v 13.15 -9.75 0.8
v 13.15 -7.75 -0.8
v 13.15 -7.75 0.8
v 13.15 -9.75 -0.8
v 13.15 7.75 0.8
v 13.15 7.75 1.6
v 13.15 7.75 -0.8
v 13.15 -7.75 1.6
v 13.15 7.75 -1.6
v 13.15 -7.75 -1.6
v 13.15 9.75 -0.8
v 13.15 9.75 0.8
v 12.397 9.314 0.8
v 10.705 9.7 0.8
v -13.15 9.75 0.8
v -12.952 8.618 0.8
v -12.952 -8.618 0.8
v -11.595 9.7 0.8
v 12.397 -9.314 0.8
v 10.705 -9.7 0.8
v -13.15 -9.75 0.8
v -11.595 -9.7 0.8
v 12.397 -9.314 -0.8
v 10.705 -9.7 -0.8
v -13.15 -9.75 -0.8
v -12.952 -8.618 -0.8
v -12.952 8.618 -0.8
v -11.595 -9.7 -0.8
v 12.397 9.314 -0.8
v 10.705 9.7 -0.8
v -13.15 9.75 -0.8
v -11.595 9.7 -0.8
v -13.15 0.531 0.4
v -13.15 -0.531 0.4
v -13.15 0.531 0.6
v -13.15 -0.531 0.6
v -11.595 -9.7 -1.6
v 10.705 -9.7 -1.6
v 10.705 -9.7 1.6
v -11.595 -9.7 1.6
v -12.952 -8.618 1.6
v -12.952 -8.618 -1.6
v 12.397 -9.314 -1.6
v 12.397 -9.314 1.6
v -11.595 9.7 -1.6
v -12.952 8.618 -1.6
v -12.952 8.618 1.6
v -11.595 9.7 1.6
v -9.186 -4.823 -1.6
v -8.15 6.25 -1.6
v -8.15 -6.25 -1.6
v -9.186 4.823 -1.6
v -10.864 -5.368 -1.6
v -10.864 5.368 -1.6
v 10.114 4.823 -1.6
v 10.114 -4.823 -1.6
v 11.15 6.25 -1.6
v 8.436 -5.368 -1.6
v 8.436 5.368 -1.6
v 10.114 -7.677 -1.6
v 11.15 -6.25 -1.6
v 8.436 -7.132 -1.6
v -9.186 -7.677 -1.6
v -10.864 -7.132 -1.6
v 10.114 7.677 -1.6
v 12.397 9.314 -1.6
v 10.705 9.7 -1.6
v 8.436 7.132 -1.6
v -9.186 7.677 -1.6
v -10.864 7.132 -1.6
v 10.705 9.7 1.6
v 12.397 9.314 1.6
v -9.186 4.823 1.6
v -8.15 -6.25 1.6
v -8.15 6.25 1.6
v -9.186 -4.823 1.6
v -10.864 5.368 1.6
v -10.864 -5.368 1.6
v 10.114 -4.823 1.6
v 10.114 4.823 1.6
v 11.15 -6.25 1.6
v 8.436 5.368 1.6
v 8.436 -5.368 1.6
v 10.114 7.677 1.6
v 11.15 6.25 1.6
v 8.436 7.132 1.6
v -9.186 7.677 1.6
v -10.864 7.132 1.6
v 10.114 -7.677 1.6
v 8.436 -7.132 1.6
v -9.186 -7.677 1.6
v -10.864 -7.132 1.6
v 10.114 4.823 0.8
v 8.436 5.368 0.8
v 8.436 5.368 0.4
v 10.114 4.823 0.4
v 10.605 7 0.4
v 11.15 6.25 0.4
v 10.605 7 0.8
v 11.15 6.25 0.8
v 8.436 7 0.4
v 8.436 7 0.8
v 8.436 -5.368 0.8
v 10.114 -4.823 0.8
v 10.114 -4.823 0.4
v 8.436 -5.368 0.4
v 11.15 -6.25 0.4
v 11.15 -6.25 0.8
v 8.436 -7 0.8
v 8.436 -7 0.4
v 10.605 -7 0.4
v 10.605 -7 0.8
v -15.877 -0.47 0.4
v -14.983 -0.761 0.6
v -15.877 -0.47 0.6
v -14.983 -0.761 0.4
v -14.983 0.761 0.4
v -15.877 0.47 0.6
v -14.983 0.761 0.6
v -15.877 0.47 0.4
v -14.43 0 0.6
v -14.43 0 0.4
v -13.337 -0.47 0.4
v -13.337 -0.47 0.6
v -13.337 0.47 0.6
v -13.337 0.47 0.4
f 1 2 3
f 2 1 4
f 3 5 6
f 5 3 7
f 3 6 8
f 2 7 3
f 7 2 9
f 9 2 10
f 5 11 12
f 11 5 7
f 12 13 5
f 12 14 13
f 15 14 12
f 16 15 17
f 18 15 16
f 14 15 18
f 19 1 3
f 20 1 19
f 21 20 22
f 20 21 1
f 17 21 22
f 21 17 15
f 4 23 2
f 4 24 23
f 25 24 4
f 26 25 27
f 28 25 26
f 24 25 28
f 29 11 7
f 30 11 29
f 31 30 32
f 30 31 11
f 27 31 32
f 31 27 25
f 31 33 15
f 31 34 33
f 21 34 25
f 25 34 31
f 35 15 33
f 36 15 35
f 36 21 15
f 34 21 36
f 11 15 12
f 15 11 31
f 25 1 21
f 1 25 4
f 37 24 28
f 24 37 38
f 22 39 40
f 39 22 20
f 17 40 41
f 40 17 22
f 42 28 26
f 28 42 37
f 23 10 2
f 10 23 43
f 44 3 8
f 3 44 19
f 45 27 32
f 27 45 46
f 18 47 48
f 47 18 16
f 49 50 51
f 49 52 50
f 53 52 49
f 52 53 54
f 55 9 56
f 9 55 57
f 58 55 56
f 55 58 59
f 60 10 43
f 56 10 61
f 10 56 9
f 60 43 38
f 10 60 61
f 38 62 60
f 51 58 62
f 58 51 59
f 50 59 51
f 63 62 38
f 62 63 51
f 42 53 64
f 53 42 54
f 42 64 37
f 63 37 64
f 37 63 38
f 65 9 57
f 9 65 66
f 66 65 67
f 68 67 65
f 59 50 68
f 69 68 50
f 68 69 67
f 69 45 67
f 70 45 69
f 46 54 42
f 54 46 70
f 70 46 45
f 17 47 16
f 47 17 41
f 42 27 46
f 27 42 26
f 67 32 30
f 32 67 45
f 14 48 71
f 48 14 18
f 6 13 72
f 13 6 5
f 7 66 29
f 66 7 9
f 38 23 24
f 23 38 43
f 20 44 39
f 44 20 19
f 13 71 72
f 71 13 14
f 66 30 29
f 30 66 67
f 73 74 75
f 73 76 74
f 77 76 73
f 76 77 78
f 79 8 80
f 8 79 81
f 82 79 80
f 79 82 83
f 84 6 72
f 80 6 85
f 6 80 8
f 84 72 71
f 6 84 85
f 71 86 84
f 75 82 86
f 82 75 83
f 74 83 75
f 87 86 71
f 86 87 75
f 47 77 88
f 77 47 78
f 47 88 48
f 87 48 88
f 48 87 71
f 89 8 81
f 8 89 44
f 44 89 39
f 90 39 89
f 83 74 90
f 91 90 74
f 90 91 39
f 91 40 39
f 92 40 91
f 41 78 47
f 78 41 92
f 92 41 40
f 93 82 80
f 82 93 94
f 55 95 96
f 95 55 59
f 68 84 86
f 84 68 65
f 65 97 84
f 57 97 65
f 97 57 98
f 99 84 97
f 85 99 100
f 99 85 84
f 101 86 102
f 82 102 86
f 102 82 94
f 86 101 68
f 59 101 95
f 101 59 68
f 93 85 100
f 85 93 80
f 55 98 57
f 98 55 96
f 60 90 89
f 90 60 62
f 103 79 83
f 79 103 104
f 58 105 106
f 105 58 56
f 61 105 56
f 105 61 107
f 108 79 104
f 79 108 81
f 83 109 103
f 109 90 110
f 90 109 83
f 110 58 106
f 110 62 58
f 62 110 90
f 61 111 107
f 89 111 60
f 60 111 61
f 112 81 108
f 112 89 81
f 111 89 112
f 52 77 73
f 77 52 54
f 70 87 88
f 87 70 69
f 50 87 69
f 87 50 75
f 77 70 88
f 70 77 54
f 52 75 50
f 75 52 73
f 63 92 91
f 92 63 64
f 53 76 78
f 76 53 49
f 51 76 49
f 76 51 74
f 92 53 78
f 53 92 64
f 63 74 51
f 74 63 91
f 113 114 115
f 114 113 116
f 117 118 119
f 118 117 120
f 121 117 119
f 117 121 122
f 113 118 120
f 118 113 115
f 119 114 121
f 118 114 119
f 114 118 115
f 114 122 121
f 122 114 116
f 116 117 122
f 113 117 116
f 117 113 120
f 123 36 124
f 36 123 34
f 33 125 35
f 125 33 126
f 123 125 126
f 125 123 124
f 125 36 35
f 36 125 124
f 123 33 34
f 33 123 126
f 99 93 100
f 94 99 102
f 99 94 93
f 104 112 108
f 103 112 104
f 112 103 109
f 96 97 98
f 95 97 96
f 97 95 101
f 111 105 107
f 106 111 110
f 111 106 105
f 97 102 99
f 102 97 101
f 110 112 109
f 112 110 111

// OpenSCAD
// Parameters
pcb_length = 26.3; //[13.15:52.6:0.1]
pcb_width = 19.5; //[9.75:39:0.1]
pcb_thickness = 1.6; //[0.8:3.2:0.1]
corner_radius = 2.0; //[0.5:4.0:0.1]
corner_overlap = 0.8; //[0.5:2.0:0.1]
mount_hole_diameter = 3.0; //[1.5:6.0:0.1]
mount_hole_edge_offset_x = 3.5; //[2.0:7.0:0.1]
mount_hole_edge_offset_y = 3.5; //[2.0:7.0:0.1]
pad_diameter = 1.6; //[0.8:3.2:0.1]
pad_height = 0.2; //[0.1:1.0:0.1]
pad_pitch = 2.54; //[2.0:5.08:0.01]
pad_count = 5; //[3:8:1]
pad_row_edge_offset_x = 3.0; //[1.5:6.0:0.1]
pad_row_center_y = 0.0; //[-5.0:5.0:0.1]
encoder_outline_length = 14.0; //[8.0:20.0:0.1]
encoder_outline_width = 14.0; //[8.0:20.0:0.1]
encoder_outline_height = 0.4; //[0.1:2.0:0.1]
encoder_center_x = 5.0; //[-5.0:10.0:0.1]
encoder_center_y = 0.0; //[-5.0:5.0:0.1]
silk_inset = 0.6; //[0.2:1.5:0.1]
silk_line_width = 0.4; //[0.2:1.0:0.1]
silk_height = 0.15; //[0.05:0.5:0.05]
union_overlap = 0.8; //[0.5:2.0:0.1]

// PCB Board with Rounded Corners
module pcb_board() {
  difference() {
    intersection() {
      union() {
        translate([0, 0, 0])
          cube([pcb_length, pcb_width, pcb_thickness], center=true);
        hull() {
          translate([pcb_length/2 - corner_radius, pcb_width/2 - corner_radius, 0])
            cylinder(r=corner_radius, h=pcb_thickness + 2*corner_overlap, center=true);
          translate([pcb_length/2 - corner_radius, -(pcb_width/2 - corner_radius), 0])
            cylinder(r=corner_radius, h=pcb_thickness + 2*corner_overlap, center=true);
          translate([-(pcb_length/2 - corner_radius), pcb_width/2 - corner_radius, 0])
            cylinder(r=corner_radius, h=pcb_thickness + 2*corner_overlap, center=true);
          translate([-(pcb_length/2 - corner_radius), -(pcb_width/2 - corner_radius), 0])
            cylinder(r=corner_radius, h=pcb_thickness + 2*corner_overlap, center=true);
        }
      }
    }
    // Mounting Holes
    union() {
      translate([pcb_length/2 - mount_hole_edge_offset_x, pcb_width/2 - mount_hole_edge_offset_y, 0])
        cylinder(r=mount_hole_diameter/2, h=pcb_thickness + 2*union_overlap, center=true);
      translate([pcb_length/2 - mount_hole_edge_offset_x, -(pcb_width/2 - mount_hole_edge_offset_y), 0])
        cylinder(r=mount_hole_diameter/2, h=pcb_thickness + 2*union_overlap, center=true);
      translate([-(pcb_length/2 - mount_hole_edge_offset_x), pcb_width/2 - mount_hole_edge_offset_y, 0])
        cylinder(r=mount_hole_diameter/2, h=pcb_thickness + 2*union_overlap, center=true);
      translate([-(pcb_length/2 - mount_hole_edge_offset_x), -(pcb_width/2 - mount_hole_edge_offset_y), 0])
        cylinder(r=mount_hole_diameter/2, h=pcb_thickness + 2*union_overlap, center=true);
    }
  }
}

// Pin Header Pads
module pin_header_pads() {
  for (i = [0:pad_count-1]) {
    translate([-(pcb_length/2 - pad_row_edge_offset_x) + (i - (pad_count-1)/2)*pad_pitch, pad_row_center_y, pcb_thickness/2 + pad_height/2 - union_overlap/2])
      cylinder(r=pad_diameter/2, h=pad_height, center=true);
  }
}

// Encoder Body Outline
module encoder_body_outline() {
  translate([encoder_center_x, encoder_center_y, pcb_thickness/2 + encoder_outline_height/2 - union_overlap/2])
    cube([encoder_outline_length, encoder_outline_width, encoder_outline_height], center=true);
}

// Silkscreen Outline
module silkscreen_outline() {
  difference() {
    translate([0, 0, pcb_thickness/2 + silk_height/2 - union_overlap/2])
      cube([pcb_length - 2*silk_inset, pcb_width - 2*silk_inset, silk_height], center=true);
    translate([0, 0, pcb_thickness/2 + silk_height/2 - union_overlap/2])
      cube([pcb_length - 2*(silk_inset + silk_line_width), pcb_width - 2*(silk_inset + silk_line_width), silk_height + 2*union_overlap], center=true);
  }
}

// Complete PCB Model
module pcb_complete_model() {
  color([0.0, 0.4, 0.2]) // Green for PCB
  union() {
    pcb_board();
    pin_header_pads();
    encoder_body_outline();
    silkscreen_outline();
  }
}

// Render the complete model
pcb_complete_model();
